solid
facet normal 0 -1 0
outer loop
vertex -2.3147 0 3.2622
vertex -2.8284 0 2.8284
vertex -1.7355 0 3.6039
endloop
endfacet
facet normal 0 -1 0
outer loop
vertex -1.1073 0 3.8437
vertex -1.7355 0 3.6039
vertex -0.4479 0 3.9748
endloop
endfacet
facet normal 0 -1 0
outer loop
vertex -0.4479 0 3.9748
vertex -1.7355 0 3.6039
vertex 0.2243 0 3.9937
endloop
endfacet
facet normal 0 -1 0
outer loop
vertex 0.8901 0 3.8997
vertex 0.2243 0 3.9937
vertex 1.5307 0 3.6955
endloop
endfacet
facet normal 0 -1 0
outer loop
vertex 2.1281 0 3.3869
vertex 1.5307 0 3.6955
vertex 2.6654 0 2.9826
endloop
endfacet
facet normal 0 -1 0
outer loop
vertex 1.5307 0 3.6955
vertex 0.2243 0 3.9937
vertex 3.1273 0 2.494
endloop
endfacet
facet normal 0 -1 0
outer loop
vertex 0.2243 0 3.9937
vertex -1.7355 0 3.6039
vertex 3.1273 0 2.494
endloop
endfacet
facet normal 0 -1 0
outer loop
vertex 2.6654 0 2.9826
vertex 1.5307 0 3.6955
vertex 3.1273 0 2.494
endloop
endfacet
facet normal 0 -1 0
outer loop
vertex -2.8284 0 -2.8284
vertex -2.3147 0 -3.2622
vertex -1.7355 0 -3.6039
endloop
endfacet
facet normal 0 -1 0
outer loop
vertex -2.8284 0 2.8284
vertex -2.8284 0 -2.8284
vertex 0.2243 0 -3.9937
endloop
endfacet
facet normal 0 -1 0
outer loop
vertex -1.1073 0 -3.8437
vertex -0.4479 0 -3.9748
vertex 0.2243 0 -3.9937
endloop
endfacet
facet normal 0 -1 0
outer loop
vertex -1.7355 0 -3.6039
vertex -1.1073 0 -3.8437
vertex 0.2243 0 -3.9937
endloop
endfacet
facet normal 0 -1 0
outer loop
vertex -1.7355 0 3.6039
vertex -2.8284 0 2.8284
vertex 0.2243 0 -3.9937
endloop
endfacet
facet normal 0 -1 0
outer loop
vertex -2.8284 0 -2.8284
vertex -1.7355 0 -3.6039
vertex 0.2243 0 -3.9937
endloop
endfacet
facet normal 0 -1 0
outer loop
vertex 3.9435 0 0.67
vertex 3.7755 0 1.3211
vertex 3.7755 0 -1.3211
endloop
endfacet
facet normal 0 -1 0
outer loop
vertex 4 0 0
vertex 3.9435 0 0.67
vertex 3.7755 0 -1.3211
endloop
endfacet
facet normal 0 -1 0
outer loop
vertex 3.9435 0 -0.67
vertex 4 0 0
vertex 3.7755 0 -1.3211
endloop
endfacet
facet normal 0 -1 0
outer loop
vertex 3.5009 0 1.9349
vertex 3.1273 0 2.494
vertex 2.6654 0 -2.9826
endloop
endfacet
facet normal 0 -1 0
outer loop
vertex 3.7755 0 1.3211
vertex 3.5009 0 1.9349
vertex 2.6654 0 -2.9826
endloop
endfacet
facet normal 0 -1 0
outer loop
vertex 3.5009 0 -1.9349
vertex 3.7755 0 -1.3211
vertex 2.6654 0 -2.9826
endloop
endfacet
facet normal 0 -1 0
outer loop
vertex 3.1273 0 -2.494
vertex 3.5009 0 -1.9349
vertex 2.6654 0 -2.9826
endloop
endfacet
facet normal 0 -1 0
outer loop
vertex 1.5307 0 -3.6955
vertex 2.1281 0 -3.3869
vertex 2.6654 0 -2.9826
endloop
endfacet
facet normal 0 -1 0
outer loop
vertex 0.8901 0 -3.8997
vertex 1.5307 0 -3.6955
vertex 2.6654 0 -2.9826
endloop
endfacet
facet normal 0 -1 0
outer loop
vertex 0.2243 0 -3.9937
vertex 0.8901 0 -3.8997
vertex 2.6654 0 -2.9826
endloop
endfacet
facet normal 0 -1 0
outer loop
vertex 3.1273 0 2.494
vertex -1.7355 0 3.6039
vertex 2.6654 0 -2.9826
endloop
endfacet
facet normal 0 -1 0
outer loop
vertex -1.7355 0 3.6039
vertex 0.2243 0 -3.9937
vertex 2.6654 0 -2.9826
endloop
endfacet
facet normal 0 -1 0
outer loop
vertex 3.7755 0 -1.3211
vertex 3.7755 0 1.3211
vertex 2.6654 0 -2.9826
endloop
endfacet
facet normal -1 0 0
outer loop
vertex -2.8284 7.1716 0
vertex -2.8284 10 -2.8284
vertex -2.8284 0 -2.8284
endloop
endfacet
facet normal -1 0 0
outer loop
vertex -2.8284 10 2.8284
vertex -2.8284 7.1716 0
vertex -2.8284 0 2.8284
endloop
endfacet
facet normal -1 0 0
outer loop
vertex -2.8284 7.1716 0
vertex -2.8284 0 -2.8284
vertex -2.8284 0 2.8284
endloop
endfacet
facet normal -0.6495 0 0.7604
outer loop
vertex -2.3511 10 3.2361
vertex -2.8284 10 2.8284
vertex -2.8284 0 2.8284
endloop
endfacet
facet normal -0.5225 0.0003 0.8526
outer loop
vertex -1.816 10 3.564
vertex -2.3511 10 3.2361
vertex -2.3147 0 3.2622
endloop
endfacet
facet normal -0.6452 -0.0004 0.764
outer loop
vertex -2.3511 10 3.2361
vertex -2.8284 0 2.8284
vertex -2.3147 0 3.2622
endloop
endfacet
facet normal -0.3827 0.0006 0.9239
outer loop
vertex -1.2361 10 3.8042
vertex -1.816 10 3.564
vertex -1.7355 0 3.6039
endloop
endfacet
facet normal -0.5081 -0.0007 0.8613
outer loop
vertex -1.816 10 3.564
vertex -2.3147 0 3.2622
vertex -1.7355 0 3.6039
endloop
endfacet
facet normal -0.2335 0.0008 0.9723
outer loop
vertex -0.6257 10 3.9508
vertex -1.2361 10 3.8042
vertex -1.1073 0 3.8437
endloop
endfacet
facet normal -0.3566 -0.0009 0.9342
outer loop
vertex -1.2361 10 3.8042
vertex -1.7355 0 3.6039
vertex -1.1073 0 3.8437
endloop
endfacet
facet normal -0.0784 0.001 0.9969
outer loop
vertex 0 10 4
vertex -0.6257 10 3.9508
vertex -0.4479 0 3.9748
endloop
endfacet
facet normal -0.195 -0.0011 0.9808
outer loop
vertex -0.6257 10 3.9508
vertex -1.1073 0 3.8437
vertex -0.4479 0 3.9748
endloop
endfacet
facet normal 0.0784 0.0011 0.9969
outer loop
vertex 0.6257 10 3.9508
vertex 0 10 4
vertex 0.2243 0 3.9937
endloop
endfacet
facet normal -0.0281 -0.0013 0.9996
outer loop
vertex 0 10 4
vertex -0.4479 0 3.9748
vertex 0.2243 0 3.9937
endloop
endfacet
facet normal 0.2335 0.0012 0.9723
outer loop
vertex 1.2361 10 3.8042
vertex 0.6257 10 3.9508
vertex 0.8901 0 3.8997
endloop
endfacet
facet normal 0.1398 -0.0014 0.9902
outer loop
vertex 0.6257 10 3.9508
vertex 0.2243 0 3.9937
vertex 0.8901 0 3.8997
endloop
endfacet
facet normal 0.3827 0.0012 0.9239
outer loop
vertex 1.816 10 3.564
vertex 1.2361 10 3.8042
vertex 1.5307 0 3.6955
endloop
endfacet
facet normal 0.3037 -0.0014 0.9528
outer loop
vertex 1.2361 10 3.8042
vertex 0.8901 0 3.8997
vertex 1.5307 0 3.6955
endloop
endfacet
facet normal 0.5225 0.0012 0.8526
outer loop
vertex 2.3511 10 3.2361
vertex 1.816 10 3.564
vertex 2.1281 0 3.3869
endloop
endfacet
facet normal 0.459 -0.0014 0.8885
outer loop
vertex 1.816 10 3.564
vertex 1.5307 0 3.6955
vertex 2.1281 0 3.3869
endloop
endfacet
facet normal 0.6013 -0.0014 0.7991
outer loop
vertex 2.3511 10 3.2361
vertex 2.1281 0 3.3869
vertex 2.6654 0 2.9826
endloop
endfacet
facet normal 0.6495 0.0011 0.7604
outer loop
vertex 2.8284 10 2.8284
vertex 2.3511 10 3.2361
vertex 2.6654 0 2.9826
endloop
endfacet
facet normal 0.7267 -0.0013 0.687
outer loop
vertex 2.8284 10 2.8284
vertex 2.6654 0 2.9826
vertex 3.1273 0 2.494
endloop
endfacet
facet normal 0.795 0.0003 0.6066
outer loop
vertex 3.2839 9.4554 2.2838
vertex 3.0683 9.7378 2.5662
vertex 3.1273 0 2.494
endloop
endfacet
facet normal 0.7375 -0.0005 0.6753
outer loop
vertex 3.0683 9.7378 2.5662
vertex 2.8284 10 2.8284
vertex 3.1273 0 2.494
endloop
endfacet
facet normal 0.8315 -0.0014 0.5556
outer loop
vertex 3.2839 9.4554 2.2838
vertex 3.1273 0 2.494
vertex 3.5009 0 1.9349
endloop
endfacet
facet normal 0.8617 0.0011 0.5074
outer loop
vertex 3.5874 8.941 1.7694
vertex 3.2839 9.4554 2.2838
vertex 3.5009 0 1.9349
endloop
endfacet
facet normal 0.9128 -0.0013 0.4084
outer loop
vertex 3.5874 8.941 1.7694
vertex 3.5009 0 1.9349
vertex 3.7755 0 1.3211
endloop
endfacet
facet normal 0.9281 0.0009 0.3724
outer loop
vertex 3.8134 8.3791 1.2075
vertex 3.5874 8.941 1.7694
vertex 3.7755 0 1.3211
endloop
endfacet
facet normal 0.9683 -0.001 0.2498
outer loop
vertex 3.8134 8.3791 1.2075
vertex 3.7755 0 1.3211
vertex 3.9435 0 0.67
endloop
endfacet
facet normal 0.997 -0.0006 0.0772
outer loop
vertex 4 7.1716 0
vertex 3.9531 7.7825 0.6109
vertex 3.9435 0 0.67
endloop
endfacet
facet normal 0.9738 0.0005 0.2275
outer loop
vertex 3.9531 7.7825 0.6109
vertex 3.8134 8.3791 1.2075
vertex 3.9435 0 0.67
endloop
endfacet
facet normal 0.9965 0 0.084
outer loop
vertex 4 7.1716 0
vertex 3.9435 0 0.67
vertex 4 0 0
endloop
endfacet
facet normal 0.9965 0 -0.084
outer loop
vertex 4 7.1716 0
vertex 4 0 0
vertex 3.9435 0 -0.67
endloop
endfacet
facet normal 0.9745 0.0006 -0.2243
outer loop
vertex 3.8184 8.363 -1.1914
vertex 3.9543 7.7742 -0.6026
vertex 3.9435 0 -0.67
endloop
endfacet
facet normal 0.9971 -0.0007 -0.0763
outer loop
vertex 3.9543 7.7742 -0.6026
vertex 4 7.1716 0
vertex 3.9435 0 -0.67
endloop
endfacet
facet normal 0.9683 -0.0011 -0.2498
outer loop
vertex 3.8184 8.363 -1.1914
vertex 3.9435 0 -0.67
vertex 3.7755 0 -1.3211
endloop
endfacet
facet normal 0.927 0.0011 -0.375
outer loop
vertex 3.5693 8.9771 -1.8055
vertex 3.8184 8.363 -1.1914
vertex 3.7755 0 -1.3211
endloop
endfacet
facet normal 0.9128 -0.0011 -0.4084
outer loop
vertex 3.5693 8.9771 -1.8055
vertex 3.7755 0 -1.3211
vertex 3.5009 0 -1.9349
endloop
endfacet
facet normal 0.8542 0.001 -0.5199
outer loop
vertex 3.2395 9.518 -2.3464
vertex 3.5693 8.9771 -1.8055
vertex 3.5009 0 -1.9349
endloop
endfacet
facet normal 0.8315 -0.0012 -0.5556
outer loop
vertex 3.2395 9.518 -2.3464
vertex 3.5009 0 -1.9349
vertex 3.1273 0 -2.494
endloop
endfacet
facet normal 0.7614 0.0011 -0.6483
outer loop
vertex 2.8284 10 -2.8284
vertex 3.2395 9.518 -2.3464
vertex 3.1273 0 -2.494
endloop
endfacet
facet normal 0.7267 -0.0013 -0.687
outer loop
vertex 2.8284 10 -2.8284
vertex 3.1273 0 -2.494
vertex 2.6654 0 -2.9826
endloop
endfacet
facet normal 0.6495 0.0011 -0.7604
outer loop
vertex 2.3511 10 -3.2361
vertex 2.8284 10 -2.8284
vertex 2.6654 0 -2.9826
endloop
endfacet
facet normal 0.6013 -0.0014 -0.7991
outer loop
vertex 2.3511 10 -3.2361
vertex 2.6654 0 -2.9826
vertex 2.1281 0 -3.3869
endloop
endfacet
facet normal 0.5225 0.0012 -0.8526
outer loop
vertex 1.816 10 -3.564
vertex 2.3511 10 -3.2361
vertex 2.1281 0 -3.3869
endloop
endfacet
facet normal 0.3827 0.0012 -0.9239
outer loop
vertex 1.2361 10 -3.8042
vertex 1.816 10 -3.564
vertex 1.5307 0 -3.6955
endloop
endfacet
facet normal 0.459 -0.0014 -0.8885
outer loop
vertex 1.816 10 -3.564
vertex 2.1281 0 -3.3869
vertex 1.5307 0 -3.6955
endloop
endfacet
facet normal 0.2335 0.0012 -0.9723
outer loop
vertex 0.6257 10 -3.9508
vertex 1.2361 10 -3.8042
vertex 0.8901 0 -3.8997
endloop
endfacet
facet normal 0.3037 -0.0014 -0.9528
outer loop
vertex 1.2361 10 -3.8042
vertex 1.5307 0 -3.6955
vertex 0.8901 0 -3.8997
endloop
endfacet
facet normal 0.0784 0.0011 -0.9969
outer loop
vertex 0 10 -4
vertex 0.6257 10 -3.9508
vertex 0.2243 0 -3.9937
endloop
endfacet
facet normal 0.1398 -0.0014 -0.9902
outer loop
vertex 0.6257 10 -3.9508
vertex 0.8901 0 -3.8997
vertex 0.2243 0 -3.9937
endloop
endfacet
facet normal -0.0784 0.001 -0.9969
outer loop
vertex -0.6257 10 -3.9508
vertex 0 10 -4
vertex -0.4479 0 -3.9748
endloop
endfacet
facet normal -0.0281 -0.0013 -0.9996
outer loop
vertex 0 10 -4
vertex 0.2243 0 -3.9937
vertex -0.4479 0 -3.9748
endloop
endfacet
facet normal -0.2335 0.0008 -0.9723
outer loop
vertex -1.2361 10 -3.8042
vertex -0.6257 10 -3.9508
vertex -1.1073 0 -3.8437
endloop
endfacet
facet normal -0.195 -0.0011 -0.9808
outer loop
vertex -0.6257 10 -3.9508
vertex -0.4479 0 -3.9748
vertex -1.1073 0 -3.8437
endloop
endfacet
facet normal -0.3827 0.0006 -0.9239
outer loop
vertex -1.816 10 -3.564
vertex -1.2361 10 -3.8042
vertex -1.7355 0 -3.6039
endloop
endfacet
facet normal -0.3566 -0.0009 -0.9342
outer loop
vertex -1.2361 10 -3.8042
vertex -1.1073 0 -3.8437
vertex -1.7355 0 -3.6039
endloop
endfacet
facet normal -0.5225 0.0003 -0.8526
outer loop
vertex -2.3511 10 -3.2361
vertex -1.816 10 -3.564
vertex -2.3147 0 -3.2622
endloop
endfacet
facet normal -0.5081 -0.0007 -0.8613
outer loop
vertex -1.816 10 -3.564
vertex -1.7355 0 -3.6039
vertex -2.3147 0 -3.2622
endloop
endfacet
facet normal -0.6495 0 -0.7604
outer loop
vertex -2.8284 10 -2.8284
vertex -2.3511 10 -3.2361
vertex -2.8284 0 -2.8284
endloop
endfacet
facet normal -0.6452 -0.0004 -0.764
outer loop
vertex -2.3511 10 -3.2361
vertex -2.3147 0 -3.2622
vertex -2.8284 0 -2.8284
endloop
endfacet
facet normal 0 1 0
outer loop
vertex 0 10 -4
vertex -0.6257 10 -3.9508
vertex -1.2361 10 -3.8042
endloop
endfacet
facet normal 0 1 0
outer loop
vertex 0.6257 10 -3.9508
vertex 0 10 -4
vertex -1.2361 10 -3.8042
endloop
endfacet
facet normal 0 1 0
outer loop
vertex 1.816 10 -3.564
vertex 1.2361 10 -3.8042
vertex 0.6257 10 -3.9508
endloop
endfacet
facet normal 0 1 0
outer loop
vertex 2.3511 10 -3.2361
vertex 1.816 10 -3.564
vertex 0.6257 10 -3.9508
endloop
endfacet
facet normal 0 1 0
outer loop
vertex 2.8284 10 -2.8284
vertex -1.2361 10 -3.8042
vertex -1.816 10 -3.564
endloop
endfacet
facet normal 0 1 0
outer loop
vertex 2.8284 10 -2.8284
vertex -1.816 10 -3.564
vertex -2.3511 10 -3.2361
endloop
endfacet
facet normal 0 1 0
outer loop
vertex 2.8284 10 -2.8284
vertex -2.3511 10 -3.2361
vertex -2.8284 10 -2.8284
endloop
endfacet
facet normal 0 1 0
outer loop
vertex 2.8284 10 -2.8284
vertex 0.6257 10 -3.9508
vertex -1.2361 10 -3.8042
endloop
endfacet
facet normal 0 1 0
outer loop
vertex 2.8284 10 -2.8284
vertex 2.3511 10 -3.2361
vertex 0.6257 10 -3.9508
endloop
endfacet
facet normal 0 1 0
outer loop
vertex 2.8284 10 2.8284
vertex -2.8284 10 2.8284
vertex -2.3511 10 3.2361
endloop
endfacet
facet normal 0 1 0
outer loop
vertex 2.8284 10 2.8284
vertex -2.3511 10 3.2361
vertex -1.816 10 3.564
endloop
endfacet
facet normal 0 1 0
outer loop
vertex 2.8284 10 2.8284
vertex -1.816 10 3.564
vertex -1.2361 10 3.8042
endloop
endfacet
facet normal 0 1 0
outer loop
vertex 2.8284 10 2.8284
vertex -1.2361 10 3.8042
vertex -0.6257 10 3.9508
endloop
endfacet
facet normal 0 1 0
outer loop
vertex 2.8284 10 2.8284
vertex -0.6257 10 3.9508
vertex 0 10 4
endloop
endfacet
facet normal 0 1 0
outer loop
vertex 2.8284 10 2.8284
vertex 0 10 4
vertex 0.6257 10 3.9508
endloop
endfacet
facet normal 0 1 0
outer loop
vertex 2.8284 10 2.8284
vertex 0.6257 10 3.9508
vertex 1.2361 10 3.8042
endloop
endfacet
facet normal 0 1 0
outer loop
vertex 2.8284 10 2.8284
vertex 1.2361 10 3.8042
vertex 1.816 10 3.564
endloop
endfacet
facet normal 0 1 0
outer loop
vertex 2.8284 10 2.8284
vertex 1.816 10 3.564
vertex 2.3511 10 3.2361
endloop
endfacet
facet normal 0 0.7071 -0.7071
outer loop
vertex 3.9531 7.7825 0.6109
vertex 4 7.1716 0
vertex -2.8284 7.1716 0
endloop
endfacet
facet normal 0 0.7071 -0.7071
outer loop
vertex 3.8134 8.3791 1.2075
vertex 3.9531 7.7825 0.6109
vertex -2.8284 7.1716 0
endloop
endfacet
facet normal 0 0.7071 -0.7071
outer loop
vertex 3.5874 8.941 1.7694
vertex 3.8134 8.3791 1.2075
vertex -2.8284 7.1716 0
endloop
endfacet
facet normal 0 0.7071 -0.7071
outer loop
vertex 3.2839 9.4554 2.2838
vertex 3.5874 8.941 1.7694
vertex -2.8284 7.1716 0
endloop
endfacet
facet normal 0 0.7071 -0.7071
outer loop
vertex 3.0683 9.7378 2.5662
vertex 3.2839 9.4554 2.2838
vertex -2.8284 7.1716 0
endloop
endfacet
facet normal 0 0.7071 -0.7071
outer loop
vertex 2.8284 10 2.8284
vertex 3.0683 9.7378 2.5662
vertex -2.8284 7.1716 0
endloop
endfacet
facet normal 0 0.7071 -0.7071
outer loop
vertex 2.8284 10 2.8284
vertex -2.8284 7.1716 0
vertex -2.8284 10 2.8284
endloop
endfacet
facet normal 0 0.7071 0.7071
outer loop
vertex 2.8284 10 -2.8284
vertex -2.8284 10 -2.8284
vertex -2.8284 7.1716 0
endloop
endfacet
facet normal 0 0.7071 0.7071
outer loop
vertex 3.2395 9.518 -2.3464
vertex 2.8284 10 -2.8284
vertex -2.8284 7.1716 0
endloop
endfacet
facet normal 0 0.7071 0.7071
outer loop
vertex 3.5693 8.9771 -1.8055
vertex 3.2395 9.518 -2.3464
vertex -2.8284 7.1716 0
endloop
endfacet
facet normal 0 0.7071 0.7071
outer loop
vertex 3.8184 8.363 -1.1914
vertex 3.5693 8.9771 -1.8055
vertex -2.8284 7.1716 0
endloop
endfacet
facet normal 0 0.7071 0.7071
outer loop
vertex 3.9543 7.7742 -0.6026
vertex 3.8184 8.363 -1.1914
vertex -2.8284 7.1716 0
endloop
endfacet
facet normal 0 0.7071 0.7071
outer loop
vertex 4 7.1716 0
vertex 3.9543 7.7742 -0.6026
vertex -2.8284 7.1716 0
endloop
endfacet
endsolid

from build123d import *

# Parameters (mm, degrees)
BOSS_EXTRUDE1_DEPTH     = 10
CUT_EXTRUDE1_REACH      = 14.753
CUT_EXTRUDE1_END_RADIUS = 4


with BuildPart() as part:
    # Sketch1 → Boss-Extrude1 (new body)
    with BuildSketch(Plane(origin=(0, 0, 0), x_dir=(1, 0, 0), z_dir=(0, 1, 0))):
        with BuildLine():
            Line((-2.828427125, 2.828427125), (-2.828427125, -2.828427125))
            ThreePointArc((-2.828427125, -2.828427125), (4, 0), (-2.828427125, 2.828427125))
        make_face()
    extrude(amount=BOSS_EXTRUDE1_DEPTH)

    # Cut-Extrude1: up to this cylinder (the profile starts inside it)
    cut_extrude1_end = Plane(origin=(0, 9.057191, 0), z_dir=(0, -1, 0)) * Cylinder(CUT_EXTRUDE1_END_RADIUS, 38.506, mode=Mode.PRIVATE)
    # Sketch2 → Cut-Extrude1 (cut, up to the surface)
    with BuildSketch(Plane.ZY.offset(2.828427125), mode=Mode.PRIVATE) as cut_extrude1_sk1:
        Polygon((-2.828427125, 10), (0, 7.171572875), (2.828427125, 10), align=None)
    cut_extrude1_tool1 = extrude(cut_extrude1_sk1.sketch, amount=-CUT_EXTRUDE1_REACH, mode=Mode.PRIVATE) & cut_extrude1_end
    add(cut_extrude1_tool1.solids().sort_by_distance((-2.828427, 9.057191, 0))[0], mode=Mode.SUBTRACT)


solid = part.part
